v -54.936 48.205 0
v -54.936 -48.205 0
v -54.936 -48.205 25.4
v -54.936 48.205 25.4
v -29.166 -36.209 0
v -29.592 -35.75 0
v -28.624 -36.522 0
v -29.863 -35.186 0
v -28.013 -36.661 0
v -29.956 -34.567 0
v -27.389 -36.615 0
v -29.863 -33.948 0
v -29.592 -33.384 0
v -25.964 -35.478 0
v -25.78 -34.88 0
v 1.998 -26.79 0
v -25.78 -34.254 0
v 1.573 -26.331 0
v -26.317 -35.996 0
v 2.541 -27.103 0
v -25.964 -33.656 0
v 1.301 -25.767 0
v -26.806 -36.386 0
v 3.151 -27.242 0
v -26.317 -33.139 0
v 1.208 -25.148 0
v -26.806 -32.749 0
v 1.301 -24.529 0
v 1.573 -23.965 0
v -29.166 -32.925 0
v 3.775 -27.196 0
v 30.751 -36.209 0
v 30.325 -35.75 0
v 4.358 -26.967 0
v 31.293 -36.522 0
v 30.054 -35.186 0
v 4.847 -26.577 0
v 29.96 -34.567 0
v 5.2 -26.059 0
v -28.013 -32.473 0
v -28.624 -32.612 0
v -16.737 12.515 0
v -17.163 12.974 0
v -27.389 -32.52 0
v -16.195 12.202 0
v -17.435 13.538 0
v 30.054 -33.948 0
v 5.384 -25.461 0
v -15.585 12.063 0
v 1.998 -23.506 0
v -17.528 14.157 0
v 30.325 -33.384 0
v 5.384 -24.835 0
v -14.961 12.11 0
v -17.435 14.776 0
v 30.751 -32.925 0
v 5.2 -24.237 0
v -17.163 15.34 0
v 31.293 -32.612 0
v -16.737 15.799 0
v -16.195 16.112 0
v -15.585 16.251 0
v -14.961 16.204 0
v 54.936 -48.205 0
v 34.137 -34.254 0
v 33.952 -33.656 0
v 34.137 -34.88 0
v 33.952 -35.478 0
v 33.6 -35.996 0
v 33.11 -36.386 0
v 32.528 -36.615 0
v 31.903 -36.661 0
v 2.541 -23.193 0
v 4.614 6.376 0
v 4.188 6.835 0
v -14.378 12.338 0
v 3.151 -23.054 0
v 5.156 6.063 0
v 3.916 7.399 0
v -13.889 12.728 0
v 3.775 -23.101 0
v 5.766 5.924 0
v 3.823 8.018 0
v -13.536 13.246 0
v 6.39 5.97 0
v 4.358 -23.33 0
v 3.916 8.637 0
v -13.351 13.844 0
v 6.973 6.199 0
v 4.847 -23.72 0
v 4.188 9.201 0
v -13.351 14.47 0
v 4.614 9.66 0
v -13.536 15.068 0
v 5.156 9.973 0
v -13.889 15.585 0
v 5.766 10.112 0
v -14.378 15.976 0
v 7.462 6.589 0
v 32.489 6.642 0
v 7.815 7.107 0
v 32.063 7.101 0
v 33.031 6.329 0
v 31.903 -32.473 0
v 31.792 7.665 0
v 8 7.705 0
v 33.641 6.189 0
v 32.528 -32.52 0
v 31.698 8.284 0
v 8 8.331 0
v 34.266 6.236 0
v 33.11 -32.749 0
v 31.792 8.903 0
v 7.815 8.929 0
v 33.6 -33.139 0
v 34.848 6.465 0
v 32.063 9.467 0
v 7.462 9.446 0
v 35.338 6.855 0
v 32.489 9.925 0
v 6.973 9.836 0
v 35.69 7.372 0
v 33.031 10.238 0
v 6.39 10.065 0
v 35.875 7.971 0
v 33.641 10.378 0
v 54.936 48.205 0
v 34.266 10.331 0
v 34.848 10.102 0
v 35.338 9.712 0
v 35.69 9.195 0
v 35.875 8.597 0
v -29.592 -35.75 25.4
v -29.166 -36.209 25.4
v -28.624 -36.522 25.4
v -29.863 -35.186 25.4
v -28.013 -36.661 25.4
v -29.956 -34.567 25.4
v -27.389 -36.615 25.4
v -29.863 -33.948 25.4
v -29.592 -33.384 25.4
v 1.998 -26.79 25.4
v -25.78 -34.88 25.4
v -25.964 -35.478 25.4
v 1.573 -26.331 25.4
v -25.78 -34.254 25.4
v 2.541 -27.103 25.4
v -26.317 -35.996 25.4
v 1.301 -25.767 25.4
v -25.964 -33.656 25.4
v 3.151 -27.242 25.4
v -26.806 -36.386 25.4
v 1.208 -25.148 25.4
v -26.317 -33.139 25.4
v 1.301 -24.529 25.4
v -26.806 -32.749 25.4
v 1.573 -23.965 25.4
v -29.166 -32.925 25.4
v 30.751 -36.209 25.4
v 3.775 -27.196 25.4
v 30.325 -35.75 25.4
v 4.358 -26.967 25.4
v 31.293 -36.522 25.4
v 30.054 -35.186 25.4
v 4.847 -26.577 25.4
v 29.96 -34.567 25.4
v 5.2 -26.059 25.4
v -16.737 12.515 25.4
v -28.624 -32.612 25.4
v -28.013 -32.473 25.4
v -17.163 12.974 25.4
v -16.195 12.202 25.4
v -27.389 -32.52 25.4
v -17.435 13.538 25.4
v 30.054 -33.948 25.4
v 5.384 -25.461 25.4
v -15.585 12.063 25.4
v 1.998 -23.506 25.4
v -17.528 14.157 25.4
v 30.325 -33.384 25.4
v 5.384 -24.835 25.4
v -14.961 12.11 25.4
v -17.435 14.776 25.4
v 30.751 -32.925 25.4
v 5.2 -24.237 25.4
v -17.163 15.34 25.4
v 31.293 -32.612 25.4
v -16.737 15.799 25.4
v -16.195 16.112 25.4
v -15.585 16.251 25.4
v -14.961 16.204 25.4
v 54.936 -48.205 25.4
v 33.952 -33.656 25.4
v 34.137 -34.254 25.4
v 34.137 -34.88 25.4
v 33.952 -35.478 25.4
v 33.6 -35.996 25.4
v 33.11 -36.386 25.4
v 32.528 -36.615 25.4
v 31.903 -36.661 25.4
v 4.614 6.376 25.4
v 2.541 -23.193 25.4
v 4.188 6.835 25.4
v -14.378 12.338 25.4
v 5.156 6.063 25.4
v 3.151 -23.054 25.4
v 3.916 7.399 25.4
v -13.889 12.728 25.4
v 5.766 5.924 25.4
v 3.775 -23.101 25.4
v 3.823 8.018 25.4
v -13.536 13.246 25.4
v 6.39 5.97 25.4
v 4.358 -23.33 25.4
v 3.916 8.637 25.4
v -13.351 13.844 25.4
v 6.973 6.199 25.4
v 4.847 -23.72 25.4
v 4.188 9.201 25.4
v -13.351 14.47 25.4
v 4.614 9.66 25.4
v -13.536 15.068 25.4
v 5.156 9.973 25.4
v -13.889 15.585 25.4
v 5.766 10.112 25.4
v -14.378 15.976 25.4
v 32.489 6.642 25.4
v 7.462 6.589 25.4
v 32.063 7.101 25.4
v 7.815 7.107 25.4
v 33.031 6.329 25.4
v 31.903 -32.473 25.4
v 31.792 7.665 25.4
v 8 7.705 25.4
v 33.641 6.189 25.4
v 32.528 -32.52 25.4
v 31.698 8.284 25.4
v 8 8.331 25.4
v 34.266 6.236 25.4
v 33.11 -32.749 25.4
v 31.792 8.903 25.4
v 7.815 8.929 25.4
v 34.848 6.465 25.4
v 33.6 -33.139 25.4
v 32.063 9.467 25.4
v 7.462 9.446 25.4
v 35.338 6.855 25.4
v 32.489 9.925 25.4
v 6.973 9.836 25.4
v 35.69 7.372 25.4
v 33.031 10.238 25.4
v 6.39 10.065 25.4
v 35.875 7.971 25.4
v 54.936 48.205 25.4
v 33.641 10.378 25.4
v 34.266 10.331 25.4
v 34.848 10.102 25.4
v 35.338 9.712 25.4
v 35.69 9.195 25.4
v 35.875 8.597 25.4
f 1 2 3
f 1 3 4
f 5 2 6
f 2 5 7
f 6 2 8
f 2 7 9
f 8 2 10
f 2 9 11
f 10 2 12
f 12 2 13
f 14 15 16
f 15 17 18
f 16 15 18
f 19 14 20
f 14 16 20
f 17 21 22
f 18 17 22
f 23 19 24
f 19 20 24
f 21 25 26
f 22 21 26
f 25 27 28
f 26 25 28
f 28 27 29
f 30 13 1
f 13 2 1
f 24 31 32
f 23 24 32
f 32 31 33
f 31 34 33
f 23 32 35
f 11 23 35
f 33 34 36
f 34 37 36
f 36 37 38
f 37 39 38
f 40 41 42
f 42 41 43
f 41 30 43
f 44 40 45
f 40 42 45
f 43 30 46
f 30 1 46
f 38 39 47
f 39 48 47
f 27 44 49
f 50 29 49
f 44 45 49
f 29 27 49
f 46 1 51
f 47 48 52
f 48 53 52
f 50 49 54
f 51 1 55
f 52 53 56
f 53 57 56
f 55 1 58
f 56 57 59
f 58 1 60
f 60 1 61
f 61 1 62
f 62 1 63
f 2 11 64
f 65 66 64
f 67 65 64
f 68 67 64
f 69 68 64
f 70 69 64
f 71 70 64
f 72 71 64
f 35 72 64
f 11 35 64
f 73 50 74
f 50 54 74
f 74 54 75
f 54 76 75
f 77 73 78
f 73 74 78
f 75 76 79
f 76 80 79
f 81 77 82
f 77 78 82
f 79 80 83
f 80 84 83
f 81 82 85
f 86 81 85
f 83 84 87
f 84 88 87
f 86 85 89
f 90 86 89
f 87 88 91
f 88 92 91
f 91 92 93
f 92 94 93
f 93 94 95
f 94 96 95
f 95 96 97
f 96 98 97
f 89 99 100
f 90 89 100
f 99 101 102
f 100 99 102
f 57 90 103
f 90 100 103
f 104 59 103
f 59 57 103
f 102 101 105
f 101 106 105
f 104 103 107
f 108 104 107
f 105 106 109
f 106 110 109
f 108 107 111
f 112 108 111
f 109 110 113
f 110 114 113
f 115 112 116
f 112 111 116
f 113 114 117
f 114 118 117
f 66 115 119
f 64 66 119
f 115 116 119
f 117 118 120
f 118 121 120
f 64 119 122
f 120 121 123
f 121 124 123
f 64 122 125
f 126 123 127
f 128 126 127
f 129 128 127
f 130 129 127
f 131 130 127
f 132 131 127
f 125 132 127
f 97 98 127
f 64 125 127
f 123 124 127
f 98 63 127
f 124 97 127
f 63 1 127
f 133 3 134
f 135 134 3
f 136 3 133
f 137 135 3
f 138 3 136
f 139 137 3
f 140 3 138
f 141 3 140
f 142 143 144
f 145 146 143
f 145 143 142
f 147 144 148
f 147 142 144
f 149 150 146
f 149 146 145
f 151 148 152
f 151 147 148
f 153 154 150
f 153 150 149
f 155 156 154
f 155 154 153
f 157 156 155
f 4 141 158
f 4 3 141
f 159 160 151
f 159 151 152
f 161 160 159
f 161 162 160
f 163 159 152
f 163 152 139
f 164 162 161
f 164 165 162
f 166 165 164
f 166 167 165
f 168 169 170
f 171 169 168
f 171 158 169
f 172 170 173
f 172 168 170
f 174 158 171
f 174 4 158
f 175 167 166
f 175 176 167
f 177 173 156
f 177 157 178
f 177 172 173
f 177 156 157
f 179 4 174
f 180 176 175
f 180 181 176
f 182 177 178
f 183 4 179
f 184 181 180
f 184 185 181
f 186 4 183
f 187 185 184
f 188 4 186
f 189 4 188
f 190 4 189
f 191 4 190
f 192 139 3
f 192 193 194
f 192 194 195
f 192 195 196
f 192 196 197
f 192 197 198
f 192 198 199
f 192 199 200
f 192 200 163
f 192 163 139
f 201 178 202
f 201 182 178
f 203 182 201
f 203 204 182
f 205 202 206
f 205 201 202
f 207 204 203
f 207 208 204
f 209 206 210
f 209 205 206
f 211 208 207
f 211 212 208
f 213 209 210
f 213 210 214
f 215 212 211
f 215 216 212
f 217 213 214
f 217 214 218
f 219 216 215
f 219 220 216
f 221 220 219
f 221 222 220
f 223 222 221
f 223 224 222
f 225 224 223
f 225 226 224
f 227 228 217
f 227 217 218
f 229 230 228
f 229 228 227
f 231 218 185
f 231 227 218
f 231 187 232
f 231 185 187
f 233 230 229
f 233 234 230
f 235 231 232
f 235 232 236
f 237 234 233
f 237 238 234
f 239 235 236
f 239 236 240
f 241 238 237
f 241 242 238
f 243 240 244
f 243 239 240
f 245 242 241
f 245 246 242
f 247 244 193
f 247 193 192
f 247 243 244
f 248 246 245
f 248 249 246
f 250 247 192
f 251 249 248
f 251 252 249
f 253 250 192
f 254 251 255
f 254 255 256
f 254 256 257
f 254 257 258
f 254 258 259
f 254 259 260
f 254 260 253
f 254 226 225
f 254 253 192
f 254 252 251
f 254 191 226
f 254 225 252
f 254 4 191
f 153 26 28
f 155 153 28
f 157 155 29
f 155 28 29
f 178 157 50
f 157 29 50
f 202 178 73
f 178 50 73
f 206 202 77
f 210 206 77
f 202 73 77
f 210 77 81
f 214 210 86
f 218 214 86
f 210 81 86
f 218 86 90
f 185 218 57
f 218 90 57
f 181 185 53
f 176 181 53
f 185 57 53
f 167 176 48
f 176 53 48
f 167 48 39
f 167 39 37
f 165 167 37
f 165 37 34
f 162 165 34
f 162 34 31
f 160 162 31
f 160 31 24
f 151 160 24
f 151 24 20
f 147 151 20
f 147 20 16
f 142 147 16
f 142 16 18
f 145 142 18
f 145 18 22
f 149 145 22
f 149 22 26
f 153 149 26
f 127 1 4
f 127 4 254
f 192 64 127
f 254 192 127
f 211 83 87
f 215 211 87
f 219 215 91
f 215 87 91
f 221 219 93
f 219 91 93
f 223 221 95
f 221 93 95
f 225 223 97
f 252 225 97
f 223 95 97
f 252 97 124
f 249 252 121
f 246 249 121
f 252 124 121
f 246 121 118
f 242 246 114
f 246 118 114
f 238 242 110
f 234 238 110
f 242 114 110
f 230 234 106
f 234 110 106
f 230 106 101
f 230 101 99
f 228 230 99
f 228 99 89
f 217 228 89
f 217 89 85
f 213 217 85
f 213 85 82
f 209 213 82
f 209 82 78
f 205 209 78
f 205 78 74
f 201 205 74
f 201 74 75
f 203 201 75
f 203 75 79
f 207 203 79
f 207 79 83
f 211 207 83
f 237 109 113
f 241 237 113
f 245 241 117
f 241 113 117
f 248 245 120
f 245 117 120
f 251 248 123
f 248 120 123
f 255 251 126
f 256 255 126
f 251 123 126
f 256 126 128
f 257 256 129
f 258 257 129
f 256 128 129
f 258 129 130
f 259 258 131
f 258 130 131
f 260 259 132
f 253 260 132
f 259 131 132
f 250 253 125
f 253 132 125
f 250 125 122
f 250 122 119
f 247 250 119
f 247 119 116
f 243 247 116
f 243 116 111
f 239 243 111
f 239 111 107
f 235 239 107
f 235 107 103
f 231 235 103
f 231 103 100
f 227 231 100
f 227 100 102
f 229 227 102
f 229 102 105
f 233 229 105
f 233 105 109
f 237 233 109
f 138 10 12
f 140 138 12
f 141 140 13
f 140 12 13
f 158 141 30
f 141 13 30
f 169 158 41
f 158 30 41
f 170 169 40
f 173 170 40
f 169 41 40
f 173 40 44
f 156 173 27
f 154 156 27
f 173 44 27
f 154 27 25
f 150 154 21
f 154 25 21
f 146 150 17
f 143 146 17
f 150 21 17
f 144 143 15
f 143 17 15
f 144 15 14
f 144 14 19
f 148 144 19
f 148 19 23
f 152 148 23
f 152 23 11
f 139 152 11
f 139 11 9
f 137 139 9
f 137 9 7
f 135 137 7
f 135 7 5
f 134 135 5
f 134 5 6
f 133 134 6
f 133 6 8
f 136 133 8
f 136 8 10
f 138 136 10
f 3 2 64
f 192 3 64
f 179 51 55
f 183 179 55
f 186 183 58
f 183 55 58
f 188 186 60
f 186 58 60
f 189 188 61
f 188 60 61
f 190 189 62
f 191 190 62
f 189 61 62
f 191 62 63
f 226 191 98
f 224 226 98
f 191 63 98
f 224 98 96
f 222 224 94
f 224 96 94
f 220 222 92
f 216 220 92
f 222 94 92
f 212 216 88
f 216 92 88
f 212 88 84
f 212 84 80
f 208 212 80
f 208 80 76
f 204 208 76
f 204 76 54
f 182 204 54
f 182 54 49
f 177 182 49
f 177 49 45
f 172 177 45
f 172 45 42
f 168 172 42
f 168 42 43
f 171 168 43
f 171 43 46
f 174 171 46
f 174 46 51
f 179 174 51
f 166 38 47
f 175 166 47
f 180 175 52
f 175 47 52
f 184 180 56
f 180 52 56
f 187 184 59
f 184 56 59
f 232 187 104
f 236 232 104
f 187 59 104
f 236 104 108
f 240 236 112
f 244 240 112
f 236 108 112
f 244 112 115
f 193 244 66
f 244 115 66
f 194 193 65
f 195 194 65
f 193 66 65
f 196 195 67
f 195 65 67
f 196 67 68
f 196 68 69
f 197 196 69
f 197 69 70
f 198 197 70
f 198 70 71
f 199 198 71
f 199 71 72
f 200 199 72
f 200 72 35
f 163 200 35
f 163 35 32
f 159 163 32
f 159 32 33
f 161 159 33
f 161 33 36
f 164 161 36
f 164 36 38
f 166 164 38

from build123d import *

# Parameters (mm, degrees)
F0_W     = 109.8725795746
F0_H     = 96.4100509882
F1_DEPTH = 25.4
F3_D     = 4.2


with BuildPart() as f1:
    # F0 (on Top) → F1 (new body)
    with BuildSketch(Plane.XY):
        Rectangle(F0_W, F0_H)
    extrude(amount=F1_DEPTH)

    # F3 (through all)
    with Locations(Plane.XY.offset(25.4)):
        with Locations((-27.8564244509, -34.5673300326), (-15.4279861599, 14.1568621621), (5.9229629114, 8.01777374), (33.7983295321, 8.2835806534), (32.0603661239, -34.5673300326), (3.3077781554, -25.1481775194)):
            Hole(F3_D / 2)


solid = f1.part
